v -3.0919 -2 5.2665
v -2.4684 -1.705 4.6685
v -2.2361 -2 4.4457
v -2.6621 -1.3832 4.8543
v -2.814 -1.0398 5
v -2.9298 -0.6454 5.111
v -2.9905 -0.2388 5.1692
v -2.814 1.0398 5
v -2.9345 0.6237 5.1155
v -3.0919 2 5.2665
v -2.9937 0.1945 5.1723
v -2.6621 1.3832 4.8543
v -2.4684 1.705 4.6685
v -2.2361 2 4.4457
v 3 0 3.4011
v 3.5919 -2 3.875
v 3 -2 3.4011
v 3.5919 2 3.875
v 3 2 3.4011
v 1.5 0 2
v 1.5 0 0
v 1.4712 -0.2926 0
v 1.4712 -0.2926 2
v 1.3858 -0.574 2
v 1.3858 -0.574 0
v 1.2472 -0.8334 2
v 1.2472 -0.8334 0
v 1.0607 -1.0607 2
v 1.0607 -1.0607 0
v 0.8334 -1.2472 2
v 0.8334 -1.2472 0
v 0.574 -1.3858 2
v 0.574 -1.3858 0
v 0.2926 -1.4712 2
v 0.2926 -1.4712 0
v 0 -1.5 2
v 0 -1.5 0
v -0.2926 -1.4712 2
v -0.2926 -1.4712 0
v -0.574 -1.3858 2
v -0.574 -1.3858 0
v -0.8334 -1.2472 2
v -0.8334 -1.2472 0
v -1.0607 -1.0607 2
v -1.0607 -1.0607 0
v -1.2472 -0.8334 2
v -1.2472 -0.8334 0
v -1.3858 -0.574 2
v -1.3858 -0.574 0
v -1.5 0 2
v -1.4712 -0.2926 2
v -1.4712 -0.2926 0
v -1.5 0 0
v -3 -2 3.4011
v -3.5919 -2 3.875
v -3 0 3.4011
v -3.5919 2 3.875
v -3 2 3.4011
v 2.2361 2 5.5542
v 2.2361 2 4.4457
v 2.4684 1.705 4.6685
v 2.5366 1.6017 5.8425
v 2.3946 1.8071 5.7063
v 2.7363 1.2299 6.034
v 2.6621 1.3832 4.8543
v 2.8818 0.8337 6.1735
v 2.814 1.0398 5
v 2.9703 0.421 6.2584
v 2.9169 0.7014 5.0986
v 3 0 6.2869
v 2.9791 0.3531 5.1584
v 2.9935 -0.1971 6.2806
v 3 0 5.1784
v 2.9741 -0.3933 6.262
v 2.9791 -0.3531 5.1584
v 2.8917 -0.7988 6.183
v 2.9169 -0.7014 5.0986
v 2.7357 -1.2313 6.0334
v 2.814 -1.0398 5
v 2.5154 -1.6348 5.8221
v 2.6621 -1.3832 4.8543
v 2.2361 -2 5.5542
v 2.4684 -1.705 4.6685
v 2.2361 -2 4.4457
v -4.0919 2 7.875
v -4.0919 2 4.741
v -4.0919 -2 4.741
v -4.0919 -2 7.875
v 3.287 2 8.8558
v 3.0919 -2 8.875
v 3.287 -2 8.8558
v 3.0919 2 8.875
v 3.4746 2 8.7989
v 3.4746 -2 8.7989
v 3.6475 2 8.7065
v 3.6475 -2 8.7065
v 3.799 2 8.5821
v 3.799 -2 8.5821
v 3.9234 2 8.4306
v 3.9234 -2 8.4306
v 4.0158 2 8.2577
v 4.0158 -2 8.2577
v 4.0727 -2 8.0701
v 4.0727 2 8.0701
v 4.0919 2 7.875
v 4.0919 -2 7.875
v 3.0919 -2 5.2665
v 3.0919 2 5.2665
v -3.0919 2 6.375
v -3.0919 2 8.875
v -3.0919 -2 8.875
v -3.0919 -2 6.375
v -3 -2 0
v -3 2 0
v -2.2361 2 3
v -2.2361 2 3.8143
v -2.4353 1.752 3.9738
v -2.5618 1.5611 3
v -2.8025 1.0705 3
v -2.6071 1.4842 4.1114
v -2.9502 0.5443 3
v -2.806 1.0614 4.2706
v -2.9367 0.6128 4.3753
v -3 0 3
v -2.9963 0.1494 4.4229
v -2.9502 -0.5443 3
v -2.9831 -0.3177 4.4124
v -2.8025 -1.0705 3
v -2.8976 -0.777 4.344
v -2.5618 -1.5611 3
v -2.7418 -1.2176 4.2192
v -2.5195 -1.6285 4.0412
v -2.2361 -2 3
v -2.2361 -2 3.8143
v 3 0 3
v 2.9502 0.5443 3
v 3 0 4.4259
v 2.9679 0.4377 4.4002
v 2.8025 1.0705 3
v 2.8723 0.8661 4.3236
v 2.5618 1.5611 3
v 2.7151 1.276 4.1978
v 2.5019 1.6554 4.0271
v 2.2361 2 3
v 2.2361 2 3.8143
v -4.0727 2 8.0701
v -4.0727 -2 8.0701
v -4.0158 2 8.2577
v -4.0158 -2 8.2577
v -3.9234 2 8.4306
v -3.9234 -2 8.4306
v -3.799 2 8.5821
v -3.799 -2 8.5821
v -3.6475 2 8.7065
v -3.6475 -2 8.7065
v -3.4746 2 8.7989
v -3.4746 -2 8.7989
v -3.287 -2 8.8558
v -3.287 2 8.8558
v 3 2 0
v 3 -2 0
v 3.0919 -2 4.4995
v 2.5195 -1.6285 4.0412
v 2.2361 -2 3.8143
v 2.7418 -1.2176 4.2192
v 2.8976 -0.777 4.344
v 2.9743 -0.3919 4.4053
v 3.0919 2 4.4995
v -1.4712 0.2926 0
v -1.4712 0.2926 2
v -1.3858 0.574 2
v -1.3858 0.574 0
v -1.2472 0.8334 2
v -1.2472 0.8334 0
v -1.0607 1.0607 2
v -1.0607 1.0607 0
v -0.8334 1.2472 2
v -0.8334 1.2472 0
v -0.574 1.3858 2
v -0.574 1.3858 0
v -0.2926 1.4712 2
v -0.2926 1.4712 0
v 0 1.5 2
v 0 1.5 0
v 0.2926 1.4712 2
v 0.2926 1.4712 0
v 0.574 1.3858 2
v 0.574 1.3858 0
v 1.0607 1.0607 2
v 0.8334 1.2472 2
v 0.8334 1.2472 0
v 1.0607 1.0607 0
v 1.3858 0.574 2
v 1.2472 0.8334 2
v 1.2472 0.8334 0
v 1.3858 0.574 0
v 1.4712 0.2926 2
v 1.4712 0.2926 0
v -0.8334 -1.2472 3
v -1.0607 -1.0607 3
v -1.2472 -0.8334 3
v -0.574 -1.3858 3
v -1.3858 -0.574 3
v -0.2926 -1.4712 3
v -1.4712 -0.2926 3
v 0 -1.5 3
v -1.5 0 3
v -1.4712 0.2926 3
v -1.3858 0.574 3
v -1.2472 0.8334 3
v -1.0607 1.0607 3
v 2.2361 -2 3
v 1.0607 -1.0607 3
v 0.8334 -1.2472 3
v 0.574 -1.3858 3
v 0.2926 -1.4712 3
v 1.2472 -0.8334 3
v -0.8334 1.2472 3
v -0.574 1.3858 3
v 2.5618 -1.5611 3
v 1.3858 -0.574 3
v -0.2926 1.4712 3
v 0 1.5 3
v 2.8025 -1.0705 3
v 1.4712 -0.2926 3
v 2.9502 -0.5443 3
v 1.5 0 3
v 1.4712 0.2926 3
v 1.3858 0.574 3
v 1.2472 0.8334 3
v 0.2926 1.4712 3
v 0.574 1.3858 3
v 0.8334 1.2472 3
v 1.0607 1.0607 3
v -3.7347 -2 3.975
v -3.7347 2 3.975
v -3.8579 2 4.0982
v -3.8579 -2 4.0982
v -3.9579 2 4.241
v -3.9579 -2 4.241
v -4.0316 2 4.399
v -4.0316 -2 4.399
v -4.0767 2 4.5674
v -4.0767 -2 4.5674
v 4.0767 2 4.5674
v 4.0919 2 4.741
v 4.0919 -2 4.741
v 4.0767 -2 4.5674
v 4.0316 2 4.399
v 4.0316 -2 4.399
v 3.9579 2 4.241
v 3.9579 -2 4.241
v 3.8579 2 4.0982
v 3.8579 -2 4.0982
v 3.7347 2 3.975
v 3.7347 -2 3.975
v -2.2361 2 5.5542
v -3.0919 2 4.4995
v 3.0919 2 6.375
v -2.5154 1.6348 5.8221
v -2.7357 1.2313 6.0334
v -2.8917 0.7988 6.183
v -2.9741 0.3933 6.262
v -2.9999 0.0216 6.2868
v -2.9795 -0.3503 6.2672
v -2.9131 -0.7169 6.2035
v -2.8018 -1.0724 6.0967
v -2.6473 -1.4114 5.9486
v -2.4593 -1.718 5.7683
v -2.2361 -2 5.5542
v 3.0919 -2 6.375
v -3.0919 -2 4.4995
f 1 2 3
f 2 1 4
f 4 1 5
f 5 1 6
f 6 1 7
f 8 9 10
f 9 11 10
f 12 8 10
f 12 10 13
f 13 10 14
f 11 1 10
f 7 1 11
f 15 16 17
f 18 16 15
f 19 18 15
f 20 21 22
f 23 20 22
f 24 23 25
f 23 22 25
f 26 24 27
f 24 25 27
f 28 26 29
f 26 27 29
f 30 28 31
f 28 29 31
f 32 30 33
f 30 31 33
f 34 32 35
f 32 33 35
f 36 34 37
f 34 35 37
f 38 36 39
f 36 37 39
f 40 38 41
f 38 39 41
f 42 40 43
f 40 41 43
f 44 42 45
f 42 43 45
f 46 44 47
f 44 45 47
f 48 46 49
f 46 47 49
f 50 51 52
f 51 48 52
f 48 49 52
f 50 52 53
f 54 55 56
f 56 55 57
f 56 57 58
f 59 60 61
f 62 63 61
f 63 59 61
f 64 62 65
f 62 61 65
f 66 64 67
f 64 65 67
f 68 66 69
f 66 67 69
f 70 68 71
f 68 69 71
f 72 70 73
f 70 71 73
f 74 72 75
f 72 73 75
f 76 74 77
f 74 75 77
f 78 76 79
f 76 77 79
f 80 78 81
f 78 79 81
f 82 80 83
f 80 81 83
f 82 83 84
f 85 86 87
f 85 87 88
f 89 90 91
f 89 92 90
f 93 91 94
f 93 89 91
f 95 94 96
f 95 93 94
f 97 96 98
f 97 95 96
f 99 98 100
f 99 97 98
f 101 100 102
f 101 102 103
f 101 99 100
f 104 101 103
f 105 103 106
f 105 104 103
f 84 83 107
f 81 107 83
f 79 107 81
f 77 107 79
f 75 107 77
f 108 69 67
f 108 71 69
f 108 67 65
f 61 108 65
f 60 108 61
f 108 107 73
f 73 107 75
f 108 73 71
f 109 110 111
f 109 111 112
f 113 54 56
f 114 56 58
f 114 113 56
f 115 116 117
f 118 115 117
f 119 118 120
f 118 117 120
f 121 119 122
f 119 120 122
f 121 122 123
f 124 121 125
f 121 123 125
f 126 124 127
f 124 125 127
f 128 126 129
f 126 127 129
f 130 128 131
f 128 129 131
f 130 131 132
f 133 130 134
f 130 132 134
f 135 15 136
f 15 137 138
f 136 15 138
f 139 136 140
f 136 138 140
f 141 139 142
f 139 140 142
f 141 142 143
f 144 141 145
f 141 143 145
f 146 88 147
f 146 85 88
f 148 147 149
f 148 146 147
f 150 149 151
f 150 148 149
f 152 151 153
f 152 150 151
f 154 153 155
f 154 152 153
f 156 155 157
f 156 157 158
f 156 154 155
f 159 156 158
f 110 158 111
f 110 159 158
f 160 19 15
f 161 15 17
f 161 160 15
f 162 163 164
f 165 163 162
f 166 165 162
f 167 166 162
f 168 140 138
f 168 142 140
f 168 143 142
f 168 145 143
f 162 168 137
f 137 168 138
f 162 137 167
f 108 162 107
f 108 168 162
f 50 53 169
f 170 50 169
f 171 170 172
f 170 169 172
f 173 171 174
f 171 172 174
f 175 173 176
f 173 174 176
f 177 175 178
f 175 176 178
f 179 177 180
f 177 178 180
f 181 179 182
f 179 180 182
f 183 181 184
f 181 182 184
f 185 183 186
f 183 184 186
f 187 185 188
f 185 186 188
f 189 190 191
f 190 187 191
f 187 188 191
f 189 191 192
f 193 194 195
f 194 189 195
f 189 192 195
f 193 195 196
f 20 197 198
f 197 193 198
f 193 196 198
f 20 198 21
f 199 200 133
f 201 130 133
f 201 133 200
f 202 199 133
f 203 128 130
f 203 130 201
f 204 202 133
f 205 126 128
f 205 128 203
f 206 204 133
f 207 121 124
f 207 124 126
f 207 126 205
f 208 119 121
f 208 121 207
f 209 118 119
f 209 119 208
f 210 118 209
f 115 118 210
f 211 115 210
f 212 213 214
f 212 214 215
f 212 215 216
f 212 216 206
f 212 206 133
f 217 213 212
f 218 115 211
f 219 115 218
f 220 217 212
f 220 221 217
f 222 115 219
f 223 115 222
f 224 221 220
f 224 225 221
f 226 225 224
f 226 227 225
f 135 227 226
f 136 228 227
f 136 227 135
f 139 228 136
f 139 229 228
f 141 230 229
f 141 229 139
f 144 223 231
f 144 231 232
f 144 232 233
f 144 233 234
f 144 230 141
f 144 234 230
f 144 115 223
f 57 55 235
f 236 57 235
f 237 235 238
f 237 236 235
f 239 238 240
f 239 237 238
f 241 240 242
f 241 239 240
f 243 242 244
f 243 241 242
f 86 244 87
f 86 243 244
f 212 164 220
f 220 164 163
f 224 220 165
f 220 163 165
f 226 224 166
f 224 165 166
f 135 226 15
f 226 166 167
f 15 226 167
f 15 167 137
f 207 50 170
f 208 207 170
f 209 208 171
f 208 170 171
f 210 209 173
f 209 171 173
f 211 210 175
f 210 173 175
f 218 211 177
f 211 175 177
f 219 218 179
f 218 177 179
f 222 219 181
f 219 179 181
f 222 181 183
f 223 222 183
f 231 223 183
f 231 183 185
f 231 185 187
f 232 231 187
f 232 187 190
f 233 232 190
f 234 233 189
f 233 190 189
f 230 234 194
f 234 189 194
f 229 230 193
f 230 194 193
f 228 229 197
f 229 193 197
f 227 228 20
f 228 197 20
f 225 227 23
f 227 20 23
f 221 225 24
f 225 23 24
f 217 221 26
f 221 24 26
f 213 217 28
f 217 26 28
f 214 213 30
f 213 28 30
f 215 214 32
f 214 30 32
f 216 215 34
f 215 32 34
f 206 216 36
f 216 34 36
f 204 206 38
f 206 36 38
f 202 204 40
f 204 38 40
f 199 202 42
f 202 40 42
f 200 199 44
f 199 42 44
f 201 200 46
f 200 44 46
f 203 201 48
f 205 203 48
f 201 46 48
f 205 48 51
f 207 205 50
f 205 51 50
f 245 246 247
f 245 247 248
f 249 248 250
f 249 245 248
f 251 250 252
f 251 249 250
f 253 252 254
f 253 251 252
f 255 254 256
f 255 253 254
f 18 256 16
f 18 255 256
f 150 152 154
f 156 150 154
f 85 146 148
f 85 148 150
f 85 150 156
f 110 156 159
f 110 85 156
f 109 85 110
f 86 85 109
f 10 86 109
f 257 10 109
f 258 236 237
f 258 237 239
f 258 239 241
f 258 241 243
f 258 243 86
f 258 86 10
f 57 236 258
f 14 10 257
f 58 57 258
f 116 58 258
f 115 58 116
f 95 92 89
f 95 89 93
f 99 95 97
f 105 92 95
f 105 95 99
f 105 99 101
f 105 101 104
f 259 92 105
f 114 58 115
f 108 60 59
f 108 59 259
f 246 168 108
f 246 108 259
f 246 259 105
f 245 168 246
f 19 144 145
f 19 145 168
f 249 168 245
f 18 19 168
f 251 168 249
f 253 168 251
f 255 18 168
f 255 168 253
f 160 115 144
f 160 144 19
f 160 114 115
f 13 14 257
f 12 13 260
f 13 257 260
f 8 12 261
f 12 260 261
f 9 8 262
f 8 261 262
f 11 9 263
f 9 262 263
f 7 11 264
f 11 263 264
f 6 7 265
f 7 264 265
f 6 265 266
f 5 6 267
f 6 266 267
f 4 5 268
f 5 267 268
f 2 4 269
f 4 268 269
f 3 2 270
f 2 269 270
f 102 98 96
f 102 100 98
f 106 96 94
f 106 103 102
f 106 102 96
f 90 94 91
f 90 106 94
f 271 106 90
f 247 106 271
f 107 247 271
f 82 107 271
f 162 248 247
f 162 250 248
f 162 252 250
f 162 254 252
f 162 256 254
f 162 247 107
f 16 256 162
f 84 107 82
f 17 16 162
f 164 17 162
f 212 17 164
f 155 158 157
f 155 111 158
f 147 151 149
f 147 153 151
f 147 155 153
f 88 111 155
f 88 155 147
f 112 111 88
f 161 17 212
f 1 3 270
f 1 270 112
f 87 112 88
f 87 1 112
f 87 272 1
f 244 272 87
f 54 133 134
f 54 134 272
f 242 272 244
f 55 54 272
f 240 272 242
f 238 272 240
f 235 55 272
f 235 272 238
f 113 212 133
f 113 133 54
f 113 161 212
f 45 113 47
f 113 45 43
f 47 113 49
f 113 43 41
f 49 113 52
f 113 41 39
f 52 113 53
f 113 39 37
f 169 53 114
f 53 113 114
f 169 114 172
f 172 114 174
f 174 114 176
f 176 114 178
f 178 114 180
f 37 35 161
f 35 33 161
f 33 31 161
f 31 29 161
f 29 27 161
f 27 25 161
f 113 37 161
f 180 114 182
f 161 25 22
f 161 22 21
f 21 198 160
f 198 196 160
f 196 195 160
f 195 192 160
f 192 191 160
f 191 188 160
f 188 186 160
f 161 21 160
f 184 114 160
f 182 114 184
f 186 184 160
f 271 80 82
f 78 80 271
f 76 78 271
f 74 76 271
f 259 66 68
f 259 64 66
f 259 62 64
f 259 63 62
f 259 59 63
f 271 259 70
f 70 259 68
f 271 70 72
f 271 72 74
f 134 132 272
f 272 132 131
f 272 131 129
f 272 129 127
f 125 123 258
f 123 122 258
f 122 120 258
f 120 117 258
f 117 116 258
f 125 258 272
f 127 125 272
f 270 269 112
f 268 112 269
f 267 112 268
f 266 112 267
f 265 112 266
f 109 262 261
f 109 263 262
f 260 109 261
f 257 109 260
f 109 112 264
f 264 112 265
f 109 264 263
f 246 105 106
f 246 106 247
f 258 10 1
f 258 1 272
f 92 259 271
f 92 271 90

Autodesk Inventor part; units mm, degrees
ref_plane "YZ Plane" through (0, 0, 0) normal (1, 0, 0) x (0, 1, 0)
ref_plane "XZ Plane" through (0, 0, 0) normal (0, 1, 0) x (-1, 0, 0)
ref_plane "XY Plane" through (0, 0, 0) normal (0, 0, 1) x (1, 0, 0)
sketch "Sketch1" plane through (0, 0, 0) normal (0, 0, 1) x (1, 0, 0)
  circle A0 centre (0, 0) radius 1.5
  line L0 (-3, 2) -> (3, 2)
  line L1 (3, 2) -> (3, -2)
  line L2 (3, -2) -> (-3, -2)
  line L3 (-3, -2) -> (-3, 2)
  point P0 (-3, 0)
  point P1 (0, 2)
  dimension "d0" = 3
  dimension "d1" = 6
  dimension "d2" = 4
extrude "Extrusion1" add sketch "Sketch1" along normal blind 2
sketch "Sketch2" plane through (-3, 2, 0) normal (0, 1, 0) x (1, 0, 0)
  line L0 (6, -2) -> (0, -2) projected
  line L1 (1.75, -2) -> (4.25, -2)
  line L2 (4.25, -2) -> (4.25, -5)
  line L3 (4.25, -5) -> (1.75, -5)
  line L4 (1.75, -5) -> (1.75, -2)
  line L5 (-0.0919, -3.875) -> (-1.0919, -3.875)
  line L6 (-1.0919, -3.875) -> (-1.0919, -8.875)
  line L7 (-1.0919, -8.875) -> (-0.0919, -8.875)
  line L8 (-0.0919, -8.875) -> (-0.0919, -3.875)
  line L9 (-0.5919, -3.875) -> (1.75, -2) construction
  line L10 (1.75, -2) -> (2.25, -2.6245) construction
  line L11 (2.25, -2.6245) -> (-0.0919, -4.4995) construction
  line L12 (-0.0919, -4.4995) -> (-0.5919, -3.875) construction
  line L13 (-0.0919, -6.375) -> (2.3038, -4.0774) construction
  line L14 (2.3038, -4.0774) -> (1.75, -3.5) construction
  line L15 (1.75, -3.5) -> (-0.6456, -5.7976) construction
  line L16 (-0.6456, -5.7976) -> (-0.0919, -6.375) construction
  line L17 (6.0919, -8.875) -> (7.0919, -8.875)
  line L18 (7.0919, -8.875) -> (7.0919, -3.875)
  line L19 (7.0919, -3.875) -> (6.0919, -3.875)
  line L20 (6.0919, -3.875) -> (6.0919, -8.875)
  line L21 (4.25, -2) -> (6.5919, -3.875) construction
  line L22 (6.5919, -3.875) -> (6.0919, -4.4995) construction
  line L23 (6.0919, -4.4995) -> (3.75, -2.6245) construction
  line L24 (3.75, -2.6245) -> (4.25, -2) construction
  line L25 (6.0919, -6.375) -> (3.6962, -4.0774) construction
  line L26 (3.6962, -4.0774) -> (4.25, -3.5) construction
  line L27 (4.25, -3.5) -> (6.6456, -5.7976) construction
  line L28 (6.6456, -5.7976) -> (6.0919, -6.375) construction
  line L29 (-0.0919, -6.375) -> (1.75, -4.6085)
  line L30 (-0.0919, -6.375) -> (-0.0919, -5.2665)
  line L31 (-0.0919, -5.2665) -> (1.75, -3.5)
  line L32 (1.75, -3.5) -> (1.75, -4.6085)
  line L33 (-0.0919, -4.4995) -> (-0.0919, -3.875)
  line L34 (-0.0919, -3.875) -> (-0.5919, -3.875)
  line L35 (-0.5919, -3.875) -> (1.75, -2)
  line L36 (1.75, -2) -> (1.75, -3.0248)
  line L37 (1.75, -3.0248) -> (-0.0919, -4.4995)
  line L38 (6.0919, -6.375) -> (6.0919, -5.2665)
  line L39 (6.0919, -5.2665) -> (4.25, -3.5)
  line L40 (4.25, -3.5) -> (4.25, -4.6085)
  line L41 (4.25, -4.6085) -> (6.0919, -6.375)
  line L42 (4.25, -3.0248) -> (6.0919, -4.4995)
  line L43 (6.0919, -4.4995) -> (6.0919, -3.875)
  line L44 (6.0919, -3.875) -> (6.5919, -3.875)
  line L45 (6.5919, -3.875) -> (4.25, -2)
  line L46 (4.25, -2) -> (4.25, -3.0248)
  point P0 (3, 0)
  point P1 (3, -2)
  dimension "d5" = 2.5
  dimension "d6" = 3
  dimension "d7" = 1
  dimension "d8" = 5
  dimension "d11" = 0.8
  dimension "d13" = 3
  dimension "d15" = 0.8
  dimension "d18" = 1
  dimension "d19" = 5
  dimension "d20" = 0.8
  dimension "d21" = 3
  dimension "d22" = 0.8
extrude "Extrusion3" add sketch "Sketch2" against normal blind 4 contours L2 L3 L4 L0 | L45 L19 L20 L42 L2 | L4 L37 L8 L5 L35 | L19 L18 L17 L20 | L5 L8 L7 L6 | L39 L20 L41 L2 | L4 L29 L8 L31
fillet "Fillet1" radius 1 6 edges at (-4.0919, 0, 8.875) (4.0919, 0, 8.875) (4.0919, 0, 3.875) (-4.0919, 0, 3.875) (-1.25, 0, 5) (1.25, 0, 5)
sketch "Sketch5" plane through (-3, 2, 0) normal (0, 1, 0) x (1, 0, 0)
  line L0 (1.75, -2) -> (0, -2) projected
  line L1 (0, -2) -> (0, -3.4011)
  line L2 (1.75, -2) -> (-0.5919, -3.875) projected
  line L3 (1.75, -2) -> (0, -3.4011)
  line L4 (6, -2) -> (6, -3.4011)
  line L5 (4.25, -2) -> (1.75, -2) projected
  line L6 (6, -3.4011) -> (4.25, -2)
  line L7 (4.25, -2) -> (6, -2)
  line L8 (6.5919, -3.875) -> (4.25, -2) projected
  point P0 (3, 0)
extrude "Extrusion4" add sketch "Sketch5" against normal blind 4
sketch "Sketch6" plane through (0, 0, 0) normal (0, 0, -1) x (-1, 0, 0)
  circle A0 centre (0, 0) radius 1.5 projected
extrude "Extrusion5" cut sketch "Sketch6" against normal through all
sketch "Sketch7" plane through (-0.4564, 2, 5) normal (0, 0, 1) x (1, 0, 0)
  circle A0 centre (0.4564, -2) radius 3
  dimension "d31" = 6
extrude "Extrusion6" cut sketch "Sketch7" along normal mid plane 4
properties part number "Arm8" material "ABS Plastic"
